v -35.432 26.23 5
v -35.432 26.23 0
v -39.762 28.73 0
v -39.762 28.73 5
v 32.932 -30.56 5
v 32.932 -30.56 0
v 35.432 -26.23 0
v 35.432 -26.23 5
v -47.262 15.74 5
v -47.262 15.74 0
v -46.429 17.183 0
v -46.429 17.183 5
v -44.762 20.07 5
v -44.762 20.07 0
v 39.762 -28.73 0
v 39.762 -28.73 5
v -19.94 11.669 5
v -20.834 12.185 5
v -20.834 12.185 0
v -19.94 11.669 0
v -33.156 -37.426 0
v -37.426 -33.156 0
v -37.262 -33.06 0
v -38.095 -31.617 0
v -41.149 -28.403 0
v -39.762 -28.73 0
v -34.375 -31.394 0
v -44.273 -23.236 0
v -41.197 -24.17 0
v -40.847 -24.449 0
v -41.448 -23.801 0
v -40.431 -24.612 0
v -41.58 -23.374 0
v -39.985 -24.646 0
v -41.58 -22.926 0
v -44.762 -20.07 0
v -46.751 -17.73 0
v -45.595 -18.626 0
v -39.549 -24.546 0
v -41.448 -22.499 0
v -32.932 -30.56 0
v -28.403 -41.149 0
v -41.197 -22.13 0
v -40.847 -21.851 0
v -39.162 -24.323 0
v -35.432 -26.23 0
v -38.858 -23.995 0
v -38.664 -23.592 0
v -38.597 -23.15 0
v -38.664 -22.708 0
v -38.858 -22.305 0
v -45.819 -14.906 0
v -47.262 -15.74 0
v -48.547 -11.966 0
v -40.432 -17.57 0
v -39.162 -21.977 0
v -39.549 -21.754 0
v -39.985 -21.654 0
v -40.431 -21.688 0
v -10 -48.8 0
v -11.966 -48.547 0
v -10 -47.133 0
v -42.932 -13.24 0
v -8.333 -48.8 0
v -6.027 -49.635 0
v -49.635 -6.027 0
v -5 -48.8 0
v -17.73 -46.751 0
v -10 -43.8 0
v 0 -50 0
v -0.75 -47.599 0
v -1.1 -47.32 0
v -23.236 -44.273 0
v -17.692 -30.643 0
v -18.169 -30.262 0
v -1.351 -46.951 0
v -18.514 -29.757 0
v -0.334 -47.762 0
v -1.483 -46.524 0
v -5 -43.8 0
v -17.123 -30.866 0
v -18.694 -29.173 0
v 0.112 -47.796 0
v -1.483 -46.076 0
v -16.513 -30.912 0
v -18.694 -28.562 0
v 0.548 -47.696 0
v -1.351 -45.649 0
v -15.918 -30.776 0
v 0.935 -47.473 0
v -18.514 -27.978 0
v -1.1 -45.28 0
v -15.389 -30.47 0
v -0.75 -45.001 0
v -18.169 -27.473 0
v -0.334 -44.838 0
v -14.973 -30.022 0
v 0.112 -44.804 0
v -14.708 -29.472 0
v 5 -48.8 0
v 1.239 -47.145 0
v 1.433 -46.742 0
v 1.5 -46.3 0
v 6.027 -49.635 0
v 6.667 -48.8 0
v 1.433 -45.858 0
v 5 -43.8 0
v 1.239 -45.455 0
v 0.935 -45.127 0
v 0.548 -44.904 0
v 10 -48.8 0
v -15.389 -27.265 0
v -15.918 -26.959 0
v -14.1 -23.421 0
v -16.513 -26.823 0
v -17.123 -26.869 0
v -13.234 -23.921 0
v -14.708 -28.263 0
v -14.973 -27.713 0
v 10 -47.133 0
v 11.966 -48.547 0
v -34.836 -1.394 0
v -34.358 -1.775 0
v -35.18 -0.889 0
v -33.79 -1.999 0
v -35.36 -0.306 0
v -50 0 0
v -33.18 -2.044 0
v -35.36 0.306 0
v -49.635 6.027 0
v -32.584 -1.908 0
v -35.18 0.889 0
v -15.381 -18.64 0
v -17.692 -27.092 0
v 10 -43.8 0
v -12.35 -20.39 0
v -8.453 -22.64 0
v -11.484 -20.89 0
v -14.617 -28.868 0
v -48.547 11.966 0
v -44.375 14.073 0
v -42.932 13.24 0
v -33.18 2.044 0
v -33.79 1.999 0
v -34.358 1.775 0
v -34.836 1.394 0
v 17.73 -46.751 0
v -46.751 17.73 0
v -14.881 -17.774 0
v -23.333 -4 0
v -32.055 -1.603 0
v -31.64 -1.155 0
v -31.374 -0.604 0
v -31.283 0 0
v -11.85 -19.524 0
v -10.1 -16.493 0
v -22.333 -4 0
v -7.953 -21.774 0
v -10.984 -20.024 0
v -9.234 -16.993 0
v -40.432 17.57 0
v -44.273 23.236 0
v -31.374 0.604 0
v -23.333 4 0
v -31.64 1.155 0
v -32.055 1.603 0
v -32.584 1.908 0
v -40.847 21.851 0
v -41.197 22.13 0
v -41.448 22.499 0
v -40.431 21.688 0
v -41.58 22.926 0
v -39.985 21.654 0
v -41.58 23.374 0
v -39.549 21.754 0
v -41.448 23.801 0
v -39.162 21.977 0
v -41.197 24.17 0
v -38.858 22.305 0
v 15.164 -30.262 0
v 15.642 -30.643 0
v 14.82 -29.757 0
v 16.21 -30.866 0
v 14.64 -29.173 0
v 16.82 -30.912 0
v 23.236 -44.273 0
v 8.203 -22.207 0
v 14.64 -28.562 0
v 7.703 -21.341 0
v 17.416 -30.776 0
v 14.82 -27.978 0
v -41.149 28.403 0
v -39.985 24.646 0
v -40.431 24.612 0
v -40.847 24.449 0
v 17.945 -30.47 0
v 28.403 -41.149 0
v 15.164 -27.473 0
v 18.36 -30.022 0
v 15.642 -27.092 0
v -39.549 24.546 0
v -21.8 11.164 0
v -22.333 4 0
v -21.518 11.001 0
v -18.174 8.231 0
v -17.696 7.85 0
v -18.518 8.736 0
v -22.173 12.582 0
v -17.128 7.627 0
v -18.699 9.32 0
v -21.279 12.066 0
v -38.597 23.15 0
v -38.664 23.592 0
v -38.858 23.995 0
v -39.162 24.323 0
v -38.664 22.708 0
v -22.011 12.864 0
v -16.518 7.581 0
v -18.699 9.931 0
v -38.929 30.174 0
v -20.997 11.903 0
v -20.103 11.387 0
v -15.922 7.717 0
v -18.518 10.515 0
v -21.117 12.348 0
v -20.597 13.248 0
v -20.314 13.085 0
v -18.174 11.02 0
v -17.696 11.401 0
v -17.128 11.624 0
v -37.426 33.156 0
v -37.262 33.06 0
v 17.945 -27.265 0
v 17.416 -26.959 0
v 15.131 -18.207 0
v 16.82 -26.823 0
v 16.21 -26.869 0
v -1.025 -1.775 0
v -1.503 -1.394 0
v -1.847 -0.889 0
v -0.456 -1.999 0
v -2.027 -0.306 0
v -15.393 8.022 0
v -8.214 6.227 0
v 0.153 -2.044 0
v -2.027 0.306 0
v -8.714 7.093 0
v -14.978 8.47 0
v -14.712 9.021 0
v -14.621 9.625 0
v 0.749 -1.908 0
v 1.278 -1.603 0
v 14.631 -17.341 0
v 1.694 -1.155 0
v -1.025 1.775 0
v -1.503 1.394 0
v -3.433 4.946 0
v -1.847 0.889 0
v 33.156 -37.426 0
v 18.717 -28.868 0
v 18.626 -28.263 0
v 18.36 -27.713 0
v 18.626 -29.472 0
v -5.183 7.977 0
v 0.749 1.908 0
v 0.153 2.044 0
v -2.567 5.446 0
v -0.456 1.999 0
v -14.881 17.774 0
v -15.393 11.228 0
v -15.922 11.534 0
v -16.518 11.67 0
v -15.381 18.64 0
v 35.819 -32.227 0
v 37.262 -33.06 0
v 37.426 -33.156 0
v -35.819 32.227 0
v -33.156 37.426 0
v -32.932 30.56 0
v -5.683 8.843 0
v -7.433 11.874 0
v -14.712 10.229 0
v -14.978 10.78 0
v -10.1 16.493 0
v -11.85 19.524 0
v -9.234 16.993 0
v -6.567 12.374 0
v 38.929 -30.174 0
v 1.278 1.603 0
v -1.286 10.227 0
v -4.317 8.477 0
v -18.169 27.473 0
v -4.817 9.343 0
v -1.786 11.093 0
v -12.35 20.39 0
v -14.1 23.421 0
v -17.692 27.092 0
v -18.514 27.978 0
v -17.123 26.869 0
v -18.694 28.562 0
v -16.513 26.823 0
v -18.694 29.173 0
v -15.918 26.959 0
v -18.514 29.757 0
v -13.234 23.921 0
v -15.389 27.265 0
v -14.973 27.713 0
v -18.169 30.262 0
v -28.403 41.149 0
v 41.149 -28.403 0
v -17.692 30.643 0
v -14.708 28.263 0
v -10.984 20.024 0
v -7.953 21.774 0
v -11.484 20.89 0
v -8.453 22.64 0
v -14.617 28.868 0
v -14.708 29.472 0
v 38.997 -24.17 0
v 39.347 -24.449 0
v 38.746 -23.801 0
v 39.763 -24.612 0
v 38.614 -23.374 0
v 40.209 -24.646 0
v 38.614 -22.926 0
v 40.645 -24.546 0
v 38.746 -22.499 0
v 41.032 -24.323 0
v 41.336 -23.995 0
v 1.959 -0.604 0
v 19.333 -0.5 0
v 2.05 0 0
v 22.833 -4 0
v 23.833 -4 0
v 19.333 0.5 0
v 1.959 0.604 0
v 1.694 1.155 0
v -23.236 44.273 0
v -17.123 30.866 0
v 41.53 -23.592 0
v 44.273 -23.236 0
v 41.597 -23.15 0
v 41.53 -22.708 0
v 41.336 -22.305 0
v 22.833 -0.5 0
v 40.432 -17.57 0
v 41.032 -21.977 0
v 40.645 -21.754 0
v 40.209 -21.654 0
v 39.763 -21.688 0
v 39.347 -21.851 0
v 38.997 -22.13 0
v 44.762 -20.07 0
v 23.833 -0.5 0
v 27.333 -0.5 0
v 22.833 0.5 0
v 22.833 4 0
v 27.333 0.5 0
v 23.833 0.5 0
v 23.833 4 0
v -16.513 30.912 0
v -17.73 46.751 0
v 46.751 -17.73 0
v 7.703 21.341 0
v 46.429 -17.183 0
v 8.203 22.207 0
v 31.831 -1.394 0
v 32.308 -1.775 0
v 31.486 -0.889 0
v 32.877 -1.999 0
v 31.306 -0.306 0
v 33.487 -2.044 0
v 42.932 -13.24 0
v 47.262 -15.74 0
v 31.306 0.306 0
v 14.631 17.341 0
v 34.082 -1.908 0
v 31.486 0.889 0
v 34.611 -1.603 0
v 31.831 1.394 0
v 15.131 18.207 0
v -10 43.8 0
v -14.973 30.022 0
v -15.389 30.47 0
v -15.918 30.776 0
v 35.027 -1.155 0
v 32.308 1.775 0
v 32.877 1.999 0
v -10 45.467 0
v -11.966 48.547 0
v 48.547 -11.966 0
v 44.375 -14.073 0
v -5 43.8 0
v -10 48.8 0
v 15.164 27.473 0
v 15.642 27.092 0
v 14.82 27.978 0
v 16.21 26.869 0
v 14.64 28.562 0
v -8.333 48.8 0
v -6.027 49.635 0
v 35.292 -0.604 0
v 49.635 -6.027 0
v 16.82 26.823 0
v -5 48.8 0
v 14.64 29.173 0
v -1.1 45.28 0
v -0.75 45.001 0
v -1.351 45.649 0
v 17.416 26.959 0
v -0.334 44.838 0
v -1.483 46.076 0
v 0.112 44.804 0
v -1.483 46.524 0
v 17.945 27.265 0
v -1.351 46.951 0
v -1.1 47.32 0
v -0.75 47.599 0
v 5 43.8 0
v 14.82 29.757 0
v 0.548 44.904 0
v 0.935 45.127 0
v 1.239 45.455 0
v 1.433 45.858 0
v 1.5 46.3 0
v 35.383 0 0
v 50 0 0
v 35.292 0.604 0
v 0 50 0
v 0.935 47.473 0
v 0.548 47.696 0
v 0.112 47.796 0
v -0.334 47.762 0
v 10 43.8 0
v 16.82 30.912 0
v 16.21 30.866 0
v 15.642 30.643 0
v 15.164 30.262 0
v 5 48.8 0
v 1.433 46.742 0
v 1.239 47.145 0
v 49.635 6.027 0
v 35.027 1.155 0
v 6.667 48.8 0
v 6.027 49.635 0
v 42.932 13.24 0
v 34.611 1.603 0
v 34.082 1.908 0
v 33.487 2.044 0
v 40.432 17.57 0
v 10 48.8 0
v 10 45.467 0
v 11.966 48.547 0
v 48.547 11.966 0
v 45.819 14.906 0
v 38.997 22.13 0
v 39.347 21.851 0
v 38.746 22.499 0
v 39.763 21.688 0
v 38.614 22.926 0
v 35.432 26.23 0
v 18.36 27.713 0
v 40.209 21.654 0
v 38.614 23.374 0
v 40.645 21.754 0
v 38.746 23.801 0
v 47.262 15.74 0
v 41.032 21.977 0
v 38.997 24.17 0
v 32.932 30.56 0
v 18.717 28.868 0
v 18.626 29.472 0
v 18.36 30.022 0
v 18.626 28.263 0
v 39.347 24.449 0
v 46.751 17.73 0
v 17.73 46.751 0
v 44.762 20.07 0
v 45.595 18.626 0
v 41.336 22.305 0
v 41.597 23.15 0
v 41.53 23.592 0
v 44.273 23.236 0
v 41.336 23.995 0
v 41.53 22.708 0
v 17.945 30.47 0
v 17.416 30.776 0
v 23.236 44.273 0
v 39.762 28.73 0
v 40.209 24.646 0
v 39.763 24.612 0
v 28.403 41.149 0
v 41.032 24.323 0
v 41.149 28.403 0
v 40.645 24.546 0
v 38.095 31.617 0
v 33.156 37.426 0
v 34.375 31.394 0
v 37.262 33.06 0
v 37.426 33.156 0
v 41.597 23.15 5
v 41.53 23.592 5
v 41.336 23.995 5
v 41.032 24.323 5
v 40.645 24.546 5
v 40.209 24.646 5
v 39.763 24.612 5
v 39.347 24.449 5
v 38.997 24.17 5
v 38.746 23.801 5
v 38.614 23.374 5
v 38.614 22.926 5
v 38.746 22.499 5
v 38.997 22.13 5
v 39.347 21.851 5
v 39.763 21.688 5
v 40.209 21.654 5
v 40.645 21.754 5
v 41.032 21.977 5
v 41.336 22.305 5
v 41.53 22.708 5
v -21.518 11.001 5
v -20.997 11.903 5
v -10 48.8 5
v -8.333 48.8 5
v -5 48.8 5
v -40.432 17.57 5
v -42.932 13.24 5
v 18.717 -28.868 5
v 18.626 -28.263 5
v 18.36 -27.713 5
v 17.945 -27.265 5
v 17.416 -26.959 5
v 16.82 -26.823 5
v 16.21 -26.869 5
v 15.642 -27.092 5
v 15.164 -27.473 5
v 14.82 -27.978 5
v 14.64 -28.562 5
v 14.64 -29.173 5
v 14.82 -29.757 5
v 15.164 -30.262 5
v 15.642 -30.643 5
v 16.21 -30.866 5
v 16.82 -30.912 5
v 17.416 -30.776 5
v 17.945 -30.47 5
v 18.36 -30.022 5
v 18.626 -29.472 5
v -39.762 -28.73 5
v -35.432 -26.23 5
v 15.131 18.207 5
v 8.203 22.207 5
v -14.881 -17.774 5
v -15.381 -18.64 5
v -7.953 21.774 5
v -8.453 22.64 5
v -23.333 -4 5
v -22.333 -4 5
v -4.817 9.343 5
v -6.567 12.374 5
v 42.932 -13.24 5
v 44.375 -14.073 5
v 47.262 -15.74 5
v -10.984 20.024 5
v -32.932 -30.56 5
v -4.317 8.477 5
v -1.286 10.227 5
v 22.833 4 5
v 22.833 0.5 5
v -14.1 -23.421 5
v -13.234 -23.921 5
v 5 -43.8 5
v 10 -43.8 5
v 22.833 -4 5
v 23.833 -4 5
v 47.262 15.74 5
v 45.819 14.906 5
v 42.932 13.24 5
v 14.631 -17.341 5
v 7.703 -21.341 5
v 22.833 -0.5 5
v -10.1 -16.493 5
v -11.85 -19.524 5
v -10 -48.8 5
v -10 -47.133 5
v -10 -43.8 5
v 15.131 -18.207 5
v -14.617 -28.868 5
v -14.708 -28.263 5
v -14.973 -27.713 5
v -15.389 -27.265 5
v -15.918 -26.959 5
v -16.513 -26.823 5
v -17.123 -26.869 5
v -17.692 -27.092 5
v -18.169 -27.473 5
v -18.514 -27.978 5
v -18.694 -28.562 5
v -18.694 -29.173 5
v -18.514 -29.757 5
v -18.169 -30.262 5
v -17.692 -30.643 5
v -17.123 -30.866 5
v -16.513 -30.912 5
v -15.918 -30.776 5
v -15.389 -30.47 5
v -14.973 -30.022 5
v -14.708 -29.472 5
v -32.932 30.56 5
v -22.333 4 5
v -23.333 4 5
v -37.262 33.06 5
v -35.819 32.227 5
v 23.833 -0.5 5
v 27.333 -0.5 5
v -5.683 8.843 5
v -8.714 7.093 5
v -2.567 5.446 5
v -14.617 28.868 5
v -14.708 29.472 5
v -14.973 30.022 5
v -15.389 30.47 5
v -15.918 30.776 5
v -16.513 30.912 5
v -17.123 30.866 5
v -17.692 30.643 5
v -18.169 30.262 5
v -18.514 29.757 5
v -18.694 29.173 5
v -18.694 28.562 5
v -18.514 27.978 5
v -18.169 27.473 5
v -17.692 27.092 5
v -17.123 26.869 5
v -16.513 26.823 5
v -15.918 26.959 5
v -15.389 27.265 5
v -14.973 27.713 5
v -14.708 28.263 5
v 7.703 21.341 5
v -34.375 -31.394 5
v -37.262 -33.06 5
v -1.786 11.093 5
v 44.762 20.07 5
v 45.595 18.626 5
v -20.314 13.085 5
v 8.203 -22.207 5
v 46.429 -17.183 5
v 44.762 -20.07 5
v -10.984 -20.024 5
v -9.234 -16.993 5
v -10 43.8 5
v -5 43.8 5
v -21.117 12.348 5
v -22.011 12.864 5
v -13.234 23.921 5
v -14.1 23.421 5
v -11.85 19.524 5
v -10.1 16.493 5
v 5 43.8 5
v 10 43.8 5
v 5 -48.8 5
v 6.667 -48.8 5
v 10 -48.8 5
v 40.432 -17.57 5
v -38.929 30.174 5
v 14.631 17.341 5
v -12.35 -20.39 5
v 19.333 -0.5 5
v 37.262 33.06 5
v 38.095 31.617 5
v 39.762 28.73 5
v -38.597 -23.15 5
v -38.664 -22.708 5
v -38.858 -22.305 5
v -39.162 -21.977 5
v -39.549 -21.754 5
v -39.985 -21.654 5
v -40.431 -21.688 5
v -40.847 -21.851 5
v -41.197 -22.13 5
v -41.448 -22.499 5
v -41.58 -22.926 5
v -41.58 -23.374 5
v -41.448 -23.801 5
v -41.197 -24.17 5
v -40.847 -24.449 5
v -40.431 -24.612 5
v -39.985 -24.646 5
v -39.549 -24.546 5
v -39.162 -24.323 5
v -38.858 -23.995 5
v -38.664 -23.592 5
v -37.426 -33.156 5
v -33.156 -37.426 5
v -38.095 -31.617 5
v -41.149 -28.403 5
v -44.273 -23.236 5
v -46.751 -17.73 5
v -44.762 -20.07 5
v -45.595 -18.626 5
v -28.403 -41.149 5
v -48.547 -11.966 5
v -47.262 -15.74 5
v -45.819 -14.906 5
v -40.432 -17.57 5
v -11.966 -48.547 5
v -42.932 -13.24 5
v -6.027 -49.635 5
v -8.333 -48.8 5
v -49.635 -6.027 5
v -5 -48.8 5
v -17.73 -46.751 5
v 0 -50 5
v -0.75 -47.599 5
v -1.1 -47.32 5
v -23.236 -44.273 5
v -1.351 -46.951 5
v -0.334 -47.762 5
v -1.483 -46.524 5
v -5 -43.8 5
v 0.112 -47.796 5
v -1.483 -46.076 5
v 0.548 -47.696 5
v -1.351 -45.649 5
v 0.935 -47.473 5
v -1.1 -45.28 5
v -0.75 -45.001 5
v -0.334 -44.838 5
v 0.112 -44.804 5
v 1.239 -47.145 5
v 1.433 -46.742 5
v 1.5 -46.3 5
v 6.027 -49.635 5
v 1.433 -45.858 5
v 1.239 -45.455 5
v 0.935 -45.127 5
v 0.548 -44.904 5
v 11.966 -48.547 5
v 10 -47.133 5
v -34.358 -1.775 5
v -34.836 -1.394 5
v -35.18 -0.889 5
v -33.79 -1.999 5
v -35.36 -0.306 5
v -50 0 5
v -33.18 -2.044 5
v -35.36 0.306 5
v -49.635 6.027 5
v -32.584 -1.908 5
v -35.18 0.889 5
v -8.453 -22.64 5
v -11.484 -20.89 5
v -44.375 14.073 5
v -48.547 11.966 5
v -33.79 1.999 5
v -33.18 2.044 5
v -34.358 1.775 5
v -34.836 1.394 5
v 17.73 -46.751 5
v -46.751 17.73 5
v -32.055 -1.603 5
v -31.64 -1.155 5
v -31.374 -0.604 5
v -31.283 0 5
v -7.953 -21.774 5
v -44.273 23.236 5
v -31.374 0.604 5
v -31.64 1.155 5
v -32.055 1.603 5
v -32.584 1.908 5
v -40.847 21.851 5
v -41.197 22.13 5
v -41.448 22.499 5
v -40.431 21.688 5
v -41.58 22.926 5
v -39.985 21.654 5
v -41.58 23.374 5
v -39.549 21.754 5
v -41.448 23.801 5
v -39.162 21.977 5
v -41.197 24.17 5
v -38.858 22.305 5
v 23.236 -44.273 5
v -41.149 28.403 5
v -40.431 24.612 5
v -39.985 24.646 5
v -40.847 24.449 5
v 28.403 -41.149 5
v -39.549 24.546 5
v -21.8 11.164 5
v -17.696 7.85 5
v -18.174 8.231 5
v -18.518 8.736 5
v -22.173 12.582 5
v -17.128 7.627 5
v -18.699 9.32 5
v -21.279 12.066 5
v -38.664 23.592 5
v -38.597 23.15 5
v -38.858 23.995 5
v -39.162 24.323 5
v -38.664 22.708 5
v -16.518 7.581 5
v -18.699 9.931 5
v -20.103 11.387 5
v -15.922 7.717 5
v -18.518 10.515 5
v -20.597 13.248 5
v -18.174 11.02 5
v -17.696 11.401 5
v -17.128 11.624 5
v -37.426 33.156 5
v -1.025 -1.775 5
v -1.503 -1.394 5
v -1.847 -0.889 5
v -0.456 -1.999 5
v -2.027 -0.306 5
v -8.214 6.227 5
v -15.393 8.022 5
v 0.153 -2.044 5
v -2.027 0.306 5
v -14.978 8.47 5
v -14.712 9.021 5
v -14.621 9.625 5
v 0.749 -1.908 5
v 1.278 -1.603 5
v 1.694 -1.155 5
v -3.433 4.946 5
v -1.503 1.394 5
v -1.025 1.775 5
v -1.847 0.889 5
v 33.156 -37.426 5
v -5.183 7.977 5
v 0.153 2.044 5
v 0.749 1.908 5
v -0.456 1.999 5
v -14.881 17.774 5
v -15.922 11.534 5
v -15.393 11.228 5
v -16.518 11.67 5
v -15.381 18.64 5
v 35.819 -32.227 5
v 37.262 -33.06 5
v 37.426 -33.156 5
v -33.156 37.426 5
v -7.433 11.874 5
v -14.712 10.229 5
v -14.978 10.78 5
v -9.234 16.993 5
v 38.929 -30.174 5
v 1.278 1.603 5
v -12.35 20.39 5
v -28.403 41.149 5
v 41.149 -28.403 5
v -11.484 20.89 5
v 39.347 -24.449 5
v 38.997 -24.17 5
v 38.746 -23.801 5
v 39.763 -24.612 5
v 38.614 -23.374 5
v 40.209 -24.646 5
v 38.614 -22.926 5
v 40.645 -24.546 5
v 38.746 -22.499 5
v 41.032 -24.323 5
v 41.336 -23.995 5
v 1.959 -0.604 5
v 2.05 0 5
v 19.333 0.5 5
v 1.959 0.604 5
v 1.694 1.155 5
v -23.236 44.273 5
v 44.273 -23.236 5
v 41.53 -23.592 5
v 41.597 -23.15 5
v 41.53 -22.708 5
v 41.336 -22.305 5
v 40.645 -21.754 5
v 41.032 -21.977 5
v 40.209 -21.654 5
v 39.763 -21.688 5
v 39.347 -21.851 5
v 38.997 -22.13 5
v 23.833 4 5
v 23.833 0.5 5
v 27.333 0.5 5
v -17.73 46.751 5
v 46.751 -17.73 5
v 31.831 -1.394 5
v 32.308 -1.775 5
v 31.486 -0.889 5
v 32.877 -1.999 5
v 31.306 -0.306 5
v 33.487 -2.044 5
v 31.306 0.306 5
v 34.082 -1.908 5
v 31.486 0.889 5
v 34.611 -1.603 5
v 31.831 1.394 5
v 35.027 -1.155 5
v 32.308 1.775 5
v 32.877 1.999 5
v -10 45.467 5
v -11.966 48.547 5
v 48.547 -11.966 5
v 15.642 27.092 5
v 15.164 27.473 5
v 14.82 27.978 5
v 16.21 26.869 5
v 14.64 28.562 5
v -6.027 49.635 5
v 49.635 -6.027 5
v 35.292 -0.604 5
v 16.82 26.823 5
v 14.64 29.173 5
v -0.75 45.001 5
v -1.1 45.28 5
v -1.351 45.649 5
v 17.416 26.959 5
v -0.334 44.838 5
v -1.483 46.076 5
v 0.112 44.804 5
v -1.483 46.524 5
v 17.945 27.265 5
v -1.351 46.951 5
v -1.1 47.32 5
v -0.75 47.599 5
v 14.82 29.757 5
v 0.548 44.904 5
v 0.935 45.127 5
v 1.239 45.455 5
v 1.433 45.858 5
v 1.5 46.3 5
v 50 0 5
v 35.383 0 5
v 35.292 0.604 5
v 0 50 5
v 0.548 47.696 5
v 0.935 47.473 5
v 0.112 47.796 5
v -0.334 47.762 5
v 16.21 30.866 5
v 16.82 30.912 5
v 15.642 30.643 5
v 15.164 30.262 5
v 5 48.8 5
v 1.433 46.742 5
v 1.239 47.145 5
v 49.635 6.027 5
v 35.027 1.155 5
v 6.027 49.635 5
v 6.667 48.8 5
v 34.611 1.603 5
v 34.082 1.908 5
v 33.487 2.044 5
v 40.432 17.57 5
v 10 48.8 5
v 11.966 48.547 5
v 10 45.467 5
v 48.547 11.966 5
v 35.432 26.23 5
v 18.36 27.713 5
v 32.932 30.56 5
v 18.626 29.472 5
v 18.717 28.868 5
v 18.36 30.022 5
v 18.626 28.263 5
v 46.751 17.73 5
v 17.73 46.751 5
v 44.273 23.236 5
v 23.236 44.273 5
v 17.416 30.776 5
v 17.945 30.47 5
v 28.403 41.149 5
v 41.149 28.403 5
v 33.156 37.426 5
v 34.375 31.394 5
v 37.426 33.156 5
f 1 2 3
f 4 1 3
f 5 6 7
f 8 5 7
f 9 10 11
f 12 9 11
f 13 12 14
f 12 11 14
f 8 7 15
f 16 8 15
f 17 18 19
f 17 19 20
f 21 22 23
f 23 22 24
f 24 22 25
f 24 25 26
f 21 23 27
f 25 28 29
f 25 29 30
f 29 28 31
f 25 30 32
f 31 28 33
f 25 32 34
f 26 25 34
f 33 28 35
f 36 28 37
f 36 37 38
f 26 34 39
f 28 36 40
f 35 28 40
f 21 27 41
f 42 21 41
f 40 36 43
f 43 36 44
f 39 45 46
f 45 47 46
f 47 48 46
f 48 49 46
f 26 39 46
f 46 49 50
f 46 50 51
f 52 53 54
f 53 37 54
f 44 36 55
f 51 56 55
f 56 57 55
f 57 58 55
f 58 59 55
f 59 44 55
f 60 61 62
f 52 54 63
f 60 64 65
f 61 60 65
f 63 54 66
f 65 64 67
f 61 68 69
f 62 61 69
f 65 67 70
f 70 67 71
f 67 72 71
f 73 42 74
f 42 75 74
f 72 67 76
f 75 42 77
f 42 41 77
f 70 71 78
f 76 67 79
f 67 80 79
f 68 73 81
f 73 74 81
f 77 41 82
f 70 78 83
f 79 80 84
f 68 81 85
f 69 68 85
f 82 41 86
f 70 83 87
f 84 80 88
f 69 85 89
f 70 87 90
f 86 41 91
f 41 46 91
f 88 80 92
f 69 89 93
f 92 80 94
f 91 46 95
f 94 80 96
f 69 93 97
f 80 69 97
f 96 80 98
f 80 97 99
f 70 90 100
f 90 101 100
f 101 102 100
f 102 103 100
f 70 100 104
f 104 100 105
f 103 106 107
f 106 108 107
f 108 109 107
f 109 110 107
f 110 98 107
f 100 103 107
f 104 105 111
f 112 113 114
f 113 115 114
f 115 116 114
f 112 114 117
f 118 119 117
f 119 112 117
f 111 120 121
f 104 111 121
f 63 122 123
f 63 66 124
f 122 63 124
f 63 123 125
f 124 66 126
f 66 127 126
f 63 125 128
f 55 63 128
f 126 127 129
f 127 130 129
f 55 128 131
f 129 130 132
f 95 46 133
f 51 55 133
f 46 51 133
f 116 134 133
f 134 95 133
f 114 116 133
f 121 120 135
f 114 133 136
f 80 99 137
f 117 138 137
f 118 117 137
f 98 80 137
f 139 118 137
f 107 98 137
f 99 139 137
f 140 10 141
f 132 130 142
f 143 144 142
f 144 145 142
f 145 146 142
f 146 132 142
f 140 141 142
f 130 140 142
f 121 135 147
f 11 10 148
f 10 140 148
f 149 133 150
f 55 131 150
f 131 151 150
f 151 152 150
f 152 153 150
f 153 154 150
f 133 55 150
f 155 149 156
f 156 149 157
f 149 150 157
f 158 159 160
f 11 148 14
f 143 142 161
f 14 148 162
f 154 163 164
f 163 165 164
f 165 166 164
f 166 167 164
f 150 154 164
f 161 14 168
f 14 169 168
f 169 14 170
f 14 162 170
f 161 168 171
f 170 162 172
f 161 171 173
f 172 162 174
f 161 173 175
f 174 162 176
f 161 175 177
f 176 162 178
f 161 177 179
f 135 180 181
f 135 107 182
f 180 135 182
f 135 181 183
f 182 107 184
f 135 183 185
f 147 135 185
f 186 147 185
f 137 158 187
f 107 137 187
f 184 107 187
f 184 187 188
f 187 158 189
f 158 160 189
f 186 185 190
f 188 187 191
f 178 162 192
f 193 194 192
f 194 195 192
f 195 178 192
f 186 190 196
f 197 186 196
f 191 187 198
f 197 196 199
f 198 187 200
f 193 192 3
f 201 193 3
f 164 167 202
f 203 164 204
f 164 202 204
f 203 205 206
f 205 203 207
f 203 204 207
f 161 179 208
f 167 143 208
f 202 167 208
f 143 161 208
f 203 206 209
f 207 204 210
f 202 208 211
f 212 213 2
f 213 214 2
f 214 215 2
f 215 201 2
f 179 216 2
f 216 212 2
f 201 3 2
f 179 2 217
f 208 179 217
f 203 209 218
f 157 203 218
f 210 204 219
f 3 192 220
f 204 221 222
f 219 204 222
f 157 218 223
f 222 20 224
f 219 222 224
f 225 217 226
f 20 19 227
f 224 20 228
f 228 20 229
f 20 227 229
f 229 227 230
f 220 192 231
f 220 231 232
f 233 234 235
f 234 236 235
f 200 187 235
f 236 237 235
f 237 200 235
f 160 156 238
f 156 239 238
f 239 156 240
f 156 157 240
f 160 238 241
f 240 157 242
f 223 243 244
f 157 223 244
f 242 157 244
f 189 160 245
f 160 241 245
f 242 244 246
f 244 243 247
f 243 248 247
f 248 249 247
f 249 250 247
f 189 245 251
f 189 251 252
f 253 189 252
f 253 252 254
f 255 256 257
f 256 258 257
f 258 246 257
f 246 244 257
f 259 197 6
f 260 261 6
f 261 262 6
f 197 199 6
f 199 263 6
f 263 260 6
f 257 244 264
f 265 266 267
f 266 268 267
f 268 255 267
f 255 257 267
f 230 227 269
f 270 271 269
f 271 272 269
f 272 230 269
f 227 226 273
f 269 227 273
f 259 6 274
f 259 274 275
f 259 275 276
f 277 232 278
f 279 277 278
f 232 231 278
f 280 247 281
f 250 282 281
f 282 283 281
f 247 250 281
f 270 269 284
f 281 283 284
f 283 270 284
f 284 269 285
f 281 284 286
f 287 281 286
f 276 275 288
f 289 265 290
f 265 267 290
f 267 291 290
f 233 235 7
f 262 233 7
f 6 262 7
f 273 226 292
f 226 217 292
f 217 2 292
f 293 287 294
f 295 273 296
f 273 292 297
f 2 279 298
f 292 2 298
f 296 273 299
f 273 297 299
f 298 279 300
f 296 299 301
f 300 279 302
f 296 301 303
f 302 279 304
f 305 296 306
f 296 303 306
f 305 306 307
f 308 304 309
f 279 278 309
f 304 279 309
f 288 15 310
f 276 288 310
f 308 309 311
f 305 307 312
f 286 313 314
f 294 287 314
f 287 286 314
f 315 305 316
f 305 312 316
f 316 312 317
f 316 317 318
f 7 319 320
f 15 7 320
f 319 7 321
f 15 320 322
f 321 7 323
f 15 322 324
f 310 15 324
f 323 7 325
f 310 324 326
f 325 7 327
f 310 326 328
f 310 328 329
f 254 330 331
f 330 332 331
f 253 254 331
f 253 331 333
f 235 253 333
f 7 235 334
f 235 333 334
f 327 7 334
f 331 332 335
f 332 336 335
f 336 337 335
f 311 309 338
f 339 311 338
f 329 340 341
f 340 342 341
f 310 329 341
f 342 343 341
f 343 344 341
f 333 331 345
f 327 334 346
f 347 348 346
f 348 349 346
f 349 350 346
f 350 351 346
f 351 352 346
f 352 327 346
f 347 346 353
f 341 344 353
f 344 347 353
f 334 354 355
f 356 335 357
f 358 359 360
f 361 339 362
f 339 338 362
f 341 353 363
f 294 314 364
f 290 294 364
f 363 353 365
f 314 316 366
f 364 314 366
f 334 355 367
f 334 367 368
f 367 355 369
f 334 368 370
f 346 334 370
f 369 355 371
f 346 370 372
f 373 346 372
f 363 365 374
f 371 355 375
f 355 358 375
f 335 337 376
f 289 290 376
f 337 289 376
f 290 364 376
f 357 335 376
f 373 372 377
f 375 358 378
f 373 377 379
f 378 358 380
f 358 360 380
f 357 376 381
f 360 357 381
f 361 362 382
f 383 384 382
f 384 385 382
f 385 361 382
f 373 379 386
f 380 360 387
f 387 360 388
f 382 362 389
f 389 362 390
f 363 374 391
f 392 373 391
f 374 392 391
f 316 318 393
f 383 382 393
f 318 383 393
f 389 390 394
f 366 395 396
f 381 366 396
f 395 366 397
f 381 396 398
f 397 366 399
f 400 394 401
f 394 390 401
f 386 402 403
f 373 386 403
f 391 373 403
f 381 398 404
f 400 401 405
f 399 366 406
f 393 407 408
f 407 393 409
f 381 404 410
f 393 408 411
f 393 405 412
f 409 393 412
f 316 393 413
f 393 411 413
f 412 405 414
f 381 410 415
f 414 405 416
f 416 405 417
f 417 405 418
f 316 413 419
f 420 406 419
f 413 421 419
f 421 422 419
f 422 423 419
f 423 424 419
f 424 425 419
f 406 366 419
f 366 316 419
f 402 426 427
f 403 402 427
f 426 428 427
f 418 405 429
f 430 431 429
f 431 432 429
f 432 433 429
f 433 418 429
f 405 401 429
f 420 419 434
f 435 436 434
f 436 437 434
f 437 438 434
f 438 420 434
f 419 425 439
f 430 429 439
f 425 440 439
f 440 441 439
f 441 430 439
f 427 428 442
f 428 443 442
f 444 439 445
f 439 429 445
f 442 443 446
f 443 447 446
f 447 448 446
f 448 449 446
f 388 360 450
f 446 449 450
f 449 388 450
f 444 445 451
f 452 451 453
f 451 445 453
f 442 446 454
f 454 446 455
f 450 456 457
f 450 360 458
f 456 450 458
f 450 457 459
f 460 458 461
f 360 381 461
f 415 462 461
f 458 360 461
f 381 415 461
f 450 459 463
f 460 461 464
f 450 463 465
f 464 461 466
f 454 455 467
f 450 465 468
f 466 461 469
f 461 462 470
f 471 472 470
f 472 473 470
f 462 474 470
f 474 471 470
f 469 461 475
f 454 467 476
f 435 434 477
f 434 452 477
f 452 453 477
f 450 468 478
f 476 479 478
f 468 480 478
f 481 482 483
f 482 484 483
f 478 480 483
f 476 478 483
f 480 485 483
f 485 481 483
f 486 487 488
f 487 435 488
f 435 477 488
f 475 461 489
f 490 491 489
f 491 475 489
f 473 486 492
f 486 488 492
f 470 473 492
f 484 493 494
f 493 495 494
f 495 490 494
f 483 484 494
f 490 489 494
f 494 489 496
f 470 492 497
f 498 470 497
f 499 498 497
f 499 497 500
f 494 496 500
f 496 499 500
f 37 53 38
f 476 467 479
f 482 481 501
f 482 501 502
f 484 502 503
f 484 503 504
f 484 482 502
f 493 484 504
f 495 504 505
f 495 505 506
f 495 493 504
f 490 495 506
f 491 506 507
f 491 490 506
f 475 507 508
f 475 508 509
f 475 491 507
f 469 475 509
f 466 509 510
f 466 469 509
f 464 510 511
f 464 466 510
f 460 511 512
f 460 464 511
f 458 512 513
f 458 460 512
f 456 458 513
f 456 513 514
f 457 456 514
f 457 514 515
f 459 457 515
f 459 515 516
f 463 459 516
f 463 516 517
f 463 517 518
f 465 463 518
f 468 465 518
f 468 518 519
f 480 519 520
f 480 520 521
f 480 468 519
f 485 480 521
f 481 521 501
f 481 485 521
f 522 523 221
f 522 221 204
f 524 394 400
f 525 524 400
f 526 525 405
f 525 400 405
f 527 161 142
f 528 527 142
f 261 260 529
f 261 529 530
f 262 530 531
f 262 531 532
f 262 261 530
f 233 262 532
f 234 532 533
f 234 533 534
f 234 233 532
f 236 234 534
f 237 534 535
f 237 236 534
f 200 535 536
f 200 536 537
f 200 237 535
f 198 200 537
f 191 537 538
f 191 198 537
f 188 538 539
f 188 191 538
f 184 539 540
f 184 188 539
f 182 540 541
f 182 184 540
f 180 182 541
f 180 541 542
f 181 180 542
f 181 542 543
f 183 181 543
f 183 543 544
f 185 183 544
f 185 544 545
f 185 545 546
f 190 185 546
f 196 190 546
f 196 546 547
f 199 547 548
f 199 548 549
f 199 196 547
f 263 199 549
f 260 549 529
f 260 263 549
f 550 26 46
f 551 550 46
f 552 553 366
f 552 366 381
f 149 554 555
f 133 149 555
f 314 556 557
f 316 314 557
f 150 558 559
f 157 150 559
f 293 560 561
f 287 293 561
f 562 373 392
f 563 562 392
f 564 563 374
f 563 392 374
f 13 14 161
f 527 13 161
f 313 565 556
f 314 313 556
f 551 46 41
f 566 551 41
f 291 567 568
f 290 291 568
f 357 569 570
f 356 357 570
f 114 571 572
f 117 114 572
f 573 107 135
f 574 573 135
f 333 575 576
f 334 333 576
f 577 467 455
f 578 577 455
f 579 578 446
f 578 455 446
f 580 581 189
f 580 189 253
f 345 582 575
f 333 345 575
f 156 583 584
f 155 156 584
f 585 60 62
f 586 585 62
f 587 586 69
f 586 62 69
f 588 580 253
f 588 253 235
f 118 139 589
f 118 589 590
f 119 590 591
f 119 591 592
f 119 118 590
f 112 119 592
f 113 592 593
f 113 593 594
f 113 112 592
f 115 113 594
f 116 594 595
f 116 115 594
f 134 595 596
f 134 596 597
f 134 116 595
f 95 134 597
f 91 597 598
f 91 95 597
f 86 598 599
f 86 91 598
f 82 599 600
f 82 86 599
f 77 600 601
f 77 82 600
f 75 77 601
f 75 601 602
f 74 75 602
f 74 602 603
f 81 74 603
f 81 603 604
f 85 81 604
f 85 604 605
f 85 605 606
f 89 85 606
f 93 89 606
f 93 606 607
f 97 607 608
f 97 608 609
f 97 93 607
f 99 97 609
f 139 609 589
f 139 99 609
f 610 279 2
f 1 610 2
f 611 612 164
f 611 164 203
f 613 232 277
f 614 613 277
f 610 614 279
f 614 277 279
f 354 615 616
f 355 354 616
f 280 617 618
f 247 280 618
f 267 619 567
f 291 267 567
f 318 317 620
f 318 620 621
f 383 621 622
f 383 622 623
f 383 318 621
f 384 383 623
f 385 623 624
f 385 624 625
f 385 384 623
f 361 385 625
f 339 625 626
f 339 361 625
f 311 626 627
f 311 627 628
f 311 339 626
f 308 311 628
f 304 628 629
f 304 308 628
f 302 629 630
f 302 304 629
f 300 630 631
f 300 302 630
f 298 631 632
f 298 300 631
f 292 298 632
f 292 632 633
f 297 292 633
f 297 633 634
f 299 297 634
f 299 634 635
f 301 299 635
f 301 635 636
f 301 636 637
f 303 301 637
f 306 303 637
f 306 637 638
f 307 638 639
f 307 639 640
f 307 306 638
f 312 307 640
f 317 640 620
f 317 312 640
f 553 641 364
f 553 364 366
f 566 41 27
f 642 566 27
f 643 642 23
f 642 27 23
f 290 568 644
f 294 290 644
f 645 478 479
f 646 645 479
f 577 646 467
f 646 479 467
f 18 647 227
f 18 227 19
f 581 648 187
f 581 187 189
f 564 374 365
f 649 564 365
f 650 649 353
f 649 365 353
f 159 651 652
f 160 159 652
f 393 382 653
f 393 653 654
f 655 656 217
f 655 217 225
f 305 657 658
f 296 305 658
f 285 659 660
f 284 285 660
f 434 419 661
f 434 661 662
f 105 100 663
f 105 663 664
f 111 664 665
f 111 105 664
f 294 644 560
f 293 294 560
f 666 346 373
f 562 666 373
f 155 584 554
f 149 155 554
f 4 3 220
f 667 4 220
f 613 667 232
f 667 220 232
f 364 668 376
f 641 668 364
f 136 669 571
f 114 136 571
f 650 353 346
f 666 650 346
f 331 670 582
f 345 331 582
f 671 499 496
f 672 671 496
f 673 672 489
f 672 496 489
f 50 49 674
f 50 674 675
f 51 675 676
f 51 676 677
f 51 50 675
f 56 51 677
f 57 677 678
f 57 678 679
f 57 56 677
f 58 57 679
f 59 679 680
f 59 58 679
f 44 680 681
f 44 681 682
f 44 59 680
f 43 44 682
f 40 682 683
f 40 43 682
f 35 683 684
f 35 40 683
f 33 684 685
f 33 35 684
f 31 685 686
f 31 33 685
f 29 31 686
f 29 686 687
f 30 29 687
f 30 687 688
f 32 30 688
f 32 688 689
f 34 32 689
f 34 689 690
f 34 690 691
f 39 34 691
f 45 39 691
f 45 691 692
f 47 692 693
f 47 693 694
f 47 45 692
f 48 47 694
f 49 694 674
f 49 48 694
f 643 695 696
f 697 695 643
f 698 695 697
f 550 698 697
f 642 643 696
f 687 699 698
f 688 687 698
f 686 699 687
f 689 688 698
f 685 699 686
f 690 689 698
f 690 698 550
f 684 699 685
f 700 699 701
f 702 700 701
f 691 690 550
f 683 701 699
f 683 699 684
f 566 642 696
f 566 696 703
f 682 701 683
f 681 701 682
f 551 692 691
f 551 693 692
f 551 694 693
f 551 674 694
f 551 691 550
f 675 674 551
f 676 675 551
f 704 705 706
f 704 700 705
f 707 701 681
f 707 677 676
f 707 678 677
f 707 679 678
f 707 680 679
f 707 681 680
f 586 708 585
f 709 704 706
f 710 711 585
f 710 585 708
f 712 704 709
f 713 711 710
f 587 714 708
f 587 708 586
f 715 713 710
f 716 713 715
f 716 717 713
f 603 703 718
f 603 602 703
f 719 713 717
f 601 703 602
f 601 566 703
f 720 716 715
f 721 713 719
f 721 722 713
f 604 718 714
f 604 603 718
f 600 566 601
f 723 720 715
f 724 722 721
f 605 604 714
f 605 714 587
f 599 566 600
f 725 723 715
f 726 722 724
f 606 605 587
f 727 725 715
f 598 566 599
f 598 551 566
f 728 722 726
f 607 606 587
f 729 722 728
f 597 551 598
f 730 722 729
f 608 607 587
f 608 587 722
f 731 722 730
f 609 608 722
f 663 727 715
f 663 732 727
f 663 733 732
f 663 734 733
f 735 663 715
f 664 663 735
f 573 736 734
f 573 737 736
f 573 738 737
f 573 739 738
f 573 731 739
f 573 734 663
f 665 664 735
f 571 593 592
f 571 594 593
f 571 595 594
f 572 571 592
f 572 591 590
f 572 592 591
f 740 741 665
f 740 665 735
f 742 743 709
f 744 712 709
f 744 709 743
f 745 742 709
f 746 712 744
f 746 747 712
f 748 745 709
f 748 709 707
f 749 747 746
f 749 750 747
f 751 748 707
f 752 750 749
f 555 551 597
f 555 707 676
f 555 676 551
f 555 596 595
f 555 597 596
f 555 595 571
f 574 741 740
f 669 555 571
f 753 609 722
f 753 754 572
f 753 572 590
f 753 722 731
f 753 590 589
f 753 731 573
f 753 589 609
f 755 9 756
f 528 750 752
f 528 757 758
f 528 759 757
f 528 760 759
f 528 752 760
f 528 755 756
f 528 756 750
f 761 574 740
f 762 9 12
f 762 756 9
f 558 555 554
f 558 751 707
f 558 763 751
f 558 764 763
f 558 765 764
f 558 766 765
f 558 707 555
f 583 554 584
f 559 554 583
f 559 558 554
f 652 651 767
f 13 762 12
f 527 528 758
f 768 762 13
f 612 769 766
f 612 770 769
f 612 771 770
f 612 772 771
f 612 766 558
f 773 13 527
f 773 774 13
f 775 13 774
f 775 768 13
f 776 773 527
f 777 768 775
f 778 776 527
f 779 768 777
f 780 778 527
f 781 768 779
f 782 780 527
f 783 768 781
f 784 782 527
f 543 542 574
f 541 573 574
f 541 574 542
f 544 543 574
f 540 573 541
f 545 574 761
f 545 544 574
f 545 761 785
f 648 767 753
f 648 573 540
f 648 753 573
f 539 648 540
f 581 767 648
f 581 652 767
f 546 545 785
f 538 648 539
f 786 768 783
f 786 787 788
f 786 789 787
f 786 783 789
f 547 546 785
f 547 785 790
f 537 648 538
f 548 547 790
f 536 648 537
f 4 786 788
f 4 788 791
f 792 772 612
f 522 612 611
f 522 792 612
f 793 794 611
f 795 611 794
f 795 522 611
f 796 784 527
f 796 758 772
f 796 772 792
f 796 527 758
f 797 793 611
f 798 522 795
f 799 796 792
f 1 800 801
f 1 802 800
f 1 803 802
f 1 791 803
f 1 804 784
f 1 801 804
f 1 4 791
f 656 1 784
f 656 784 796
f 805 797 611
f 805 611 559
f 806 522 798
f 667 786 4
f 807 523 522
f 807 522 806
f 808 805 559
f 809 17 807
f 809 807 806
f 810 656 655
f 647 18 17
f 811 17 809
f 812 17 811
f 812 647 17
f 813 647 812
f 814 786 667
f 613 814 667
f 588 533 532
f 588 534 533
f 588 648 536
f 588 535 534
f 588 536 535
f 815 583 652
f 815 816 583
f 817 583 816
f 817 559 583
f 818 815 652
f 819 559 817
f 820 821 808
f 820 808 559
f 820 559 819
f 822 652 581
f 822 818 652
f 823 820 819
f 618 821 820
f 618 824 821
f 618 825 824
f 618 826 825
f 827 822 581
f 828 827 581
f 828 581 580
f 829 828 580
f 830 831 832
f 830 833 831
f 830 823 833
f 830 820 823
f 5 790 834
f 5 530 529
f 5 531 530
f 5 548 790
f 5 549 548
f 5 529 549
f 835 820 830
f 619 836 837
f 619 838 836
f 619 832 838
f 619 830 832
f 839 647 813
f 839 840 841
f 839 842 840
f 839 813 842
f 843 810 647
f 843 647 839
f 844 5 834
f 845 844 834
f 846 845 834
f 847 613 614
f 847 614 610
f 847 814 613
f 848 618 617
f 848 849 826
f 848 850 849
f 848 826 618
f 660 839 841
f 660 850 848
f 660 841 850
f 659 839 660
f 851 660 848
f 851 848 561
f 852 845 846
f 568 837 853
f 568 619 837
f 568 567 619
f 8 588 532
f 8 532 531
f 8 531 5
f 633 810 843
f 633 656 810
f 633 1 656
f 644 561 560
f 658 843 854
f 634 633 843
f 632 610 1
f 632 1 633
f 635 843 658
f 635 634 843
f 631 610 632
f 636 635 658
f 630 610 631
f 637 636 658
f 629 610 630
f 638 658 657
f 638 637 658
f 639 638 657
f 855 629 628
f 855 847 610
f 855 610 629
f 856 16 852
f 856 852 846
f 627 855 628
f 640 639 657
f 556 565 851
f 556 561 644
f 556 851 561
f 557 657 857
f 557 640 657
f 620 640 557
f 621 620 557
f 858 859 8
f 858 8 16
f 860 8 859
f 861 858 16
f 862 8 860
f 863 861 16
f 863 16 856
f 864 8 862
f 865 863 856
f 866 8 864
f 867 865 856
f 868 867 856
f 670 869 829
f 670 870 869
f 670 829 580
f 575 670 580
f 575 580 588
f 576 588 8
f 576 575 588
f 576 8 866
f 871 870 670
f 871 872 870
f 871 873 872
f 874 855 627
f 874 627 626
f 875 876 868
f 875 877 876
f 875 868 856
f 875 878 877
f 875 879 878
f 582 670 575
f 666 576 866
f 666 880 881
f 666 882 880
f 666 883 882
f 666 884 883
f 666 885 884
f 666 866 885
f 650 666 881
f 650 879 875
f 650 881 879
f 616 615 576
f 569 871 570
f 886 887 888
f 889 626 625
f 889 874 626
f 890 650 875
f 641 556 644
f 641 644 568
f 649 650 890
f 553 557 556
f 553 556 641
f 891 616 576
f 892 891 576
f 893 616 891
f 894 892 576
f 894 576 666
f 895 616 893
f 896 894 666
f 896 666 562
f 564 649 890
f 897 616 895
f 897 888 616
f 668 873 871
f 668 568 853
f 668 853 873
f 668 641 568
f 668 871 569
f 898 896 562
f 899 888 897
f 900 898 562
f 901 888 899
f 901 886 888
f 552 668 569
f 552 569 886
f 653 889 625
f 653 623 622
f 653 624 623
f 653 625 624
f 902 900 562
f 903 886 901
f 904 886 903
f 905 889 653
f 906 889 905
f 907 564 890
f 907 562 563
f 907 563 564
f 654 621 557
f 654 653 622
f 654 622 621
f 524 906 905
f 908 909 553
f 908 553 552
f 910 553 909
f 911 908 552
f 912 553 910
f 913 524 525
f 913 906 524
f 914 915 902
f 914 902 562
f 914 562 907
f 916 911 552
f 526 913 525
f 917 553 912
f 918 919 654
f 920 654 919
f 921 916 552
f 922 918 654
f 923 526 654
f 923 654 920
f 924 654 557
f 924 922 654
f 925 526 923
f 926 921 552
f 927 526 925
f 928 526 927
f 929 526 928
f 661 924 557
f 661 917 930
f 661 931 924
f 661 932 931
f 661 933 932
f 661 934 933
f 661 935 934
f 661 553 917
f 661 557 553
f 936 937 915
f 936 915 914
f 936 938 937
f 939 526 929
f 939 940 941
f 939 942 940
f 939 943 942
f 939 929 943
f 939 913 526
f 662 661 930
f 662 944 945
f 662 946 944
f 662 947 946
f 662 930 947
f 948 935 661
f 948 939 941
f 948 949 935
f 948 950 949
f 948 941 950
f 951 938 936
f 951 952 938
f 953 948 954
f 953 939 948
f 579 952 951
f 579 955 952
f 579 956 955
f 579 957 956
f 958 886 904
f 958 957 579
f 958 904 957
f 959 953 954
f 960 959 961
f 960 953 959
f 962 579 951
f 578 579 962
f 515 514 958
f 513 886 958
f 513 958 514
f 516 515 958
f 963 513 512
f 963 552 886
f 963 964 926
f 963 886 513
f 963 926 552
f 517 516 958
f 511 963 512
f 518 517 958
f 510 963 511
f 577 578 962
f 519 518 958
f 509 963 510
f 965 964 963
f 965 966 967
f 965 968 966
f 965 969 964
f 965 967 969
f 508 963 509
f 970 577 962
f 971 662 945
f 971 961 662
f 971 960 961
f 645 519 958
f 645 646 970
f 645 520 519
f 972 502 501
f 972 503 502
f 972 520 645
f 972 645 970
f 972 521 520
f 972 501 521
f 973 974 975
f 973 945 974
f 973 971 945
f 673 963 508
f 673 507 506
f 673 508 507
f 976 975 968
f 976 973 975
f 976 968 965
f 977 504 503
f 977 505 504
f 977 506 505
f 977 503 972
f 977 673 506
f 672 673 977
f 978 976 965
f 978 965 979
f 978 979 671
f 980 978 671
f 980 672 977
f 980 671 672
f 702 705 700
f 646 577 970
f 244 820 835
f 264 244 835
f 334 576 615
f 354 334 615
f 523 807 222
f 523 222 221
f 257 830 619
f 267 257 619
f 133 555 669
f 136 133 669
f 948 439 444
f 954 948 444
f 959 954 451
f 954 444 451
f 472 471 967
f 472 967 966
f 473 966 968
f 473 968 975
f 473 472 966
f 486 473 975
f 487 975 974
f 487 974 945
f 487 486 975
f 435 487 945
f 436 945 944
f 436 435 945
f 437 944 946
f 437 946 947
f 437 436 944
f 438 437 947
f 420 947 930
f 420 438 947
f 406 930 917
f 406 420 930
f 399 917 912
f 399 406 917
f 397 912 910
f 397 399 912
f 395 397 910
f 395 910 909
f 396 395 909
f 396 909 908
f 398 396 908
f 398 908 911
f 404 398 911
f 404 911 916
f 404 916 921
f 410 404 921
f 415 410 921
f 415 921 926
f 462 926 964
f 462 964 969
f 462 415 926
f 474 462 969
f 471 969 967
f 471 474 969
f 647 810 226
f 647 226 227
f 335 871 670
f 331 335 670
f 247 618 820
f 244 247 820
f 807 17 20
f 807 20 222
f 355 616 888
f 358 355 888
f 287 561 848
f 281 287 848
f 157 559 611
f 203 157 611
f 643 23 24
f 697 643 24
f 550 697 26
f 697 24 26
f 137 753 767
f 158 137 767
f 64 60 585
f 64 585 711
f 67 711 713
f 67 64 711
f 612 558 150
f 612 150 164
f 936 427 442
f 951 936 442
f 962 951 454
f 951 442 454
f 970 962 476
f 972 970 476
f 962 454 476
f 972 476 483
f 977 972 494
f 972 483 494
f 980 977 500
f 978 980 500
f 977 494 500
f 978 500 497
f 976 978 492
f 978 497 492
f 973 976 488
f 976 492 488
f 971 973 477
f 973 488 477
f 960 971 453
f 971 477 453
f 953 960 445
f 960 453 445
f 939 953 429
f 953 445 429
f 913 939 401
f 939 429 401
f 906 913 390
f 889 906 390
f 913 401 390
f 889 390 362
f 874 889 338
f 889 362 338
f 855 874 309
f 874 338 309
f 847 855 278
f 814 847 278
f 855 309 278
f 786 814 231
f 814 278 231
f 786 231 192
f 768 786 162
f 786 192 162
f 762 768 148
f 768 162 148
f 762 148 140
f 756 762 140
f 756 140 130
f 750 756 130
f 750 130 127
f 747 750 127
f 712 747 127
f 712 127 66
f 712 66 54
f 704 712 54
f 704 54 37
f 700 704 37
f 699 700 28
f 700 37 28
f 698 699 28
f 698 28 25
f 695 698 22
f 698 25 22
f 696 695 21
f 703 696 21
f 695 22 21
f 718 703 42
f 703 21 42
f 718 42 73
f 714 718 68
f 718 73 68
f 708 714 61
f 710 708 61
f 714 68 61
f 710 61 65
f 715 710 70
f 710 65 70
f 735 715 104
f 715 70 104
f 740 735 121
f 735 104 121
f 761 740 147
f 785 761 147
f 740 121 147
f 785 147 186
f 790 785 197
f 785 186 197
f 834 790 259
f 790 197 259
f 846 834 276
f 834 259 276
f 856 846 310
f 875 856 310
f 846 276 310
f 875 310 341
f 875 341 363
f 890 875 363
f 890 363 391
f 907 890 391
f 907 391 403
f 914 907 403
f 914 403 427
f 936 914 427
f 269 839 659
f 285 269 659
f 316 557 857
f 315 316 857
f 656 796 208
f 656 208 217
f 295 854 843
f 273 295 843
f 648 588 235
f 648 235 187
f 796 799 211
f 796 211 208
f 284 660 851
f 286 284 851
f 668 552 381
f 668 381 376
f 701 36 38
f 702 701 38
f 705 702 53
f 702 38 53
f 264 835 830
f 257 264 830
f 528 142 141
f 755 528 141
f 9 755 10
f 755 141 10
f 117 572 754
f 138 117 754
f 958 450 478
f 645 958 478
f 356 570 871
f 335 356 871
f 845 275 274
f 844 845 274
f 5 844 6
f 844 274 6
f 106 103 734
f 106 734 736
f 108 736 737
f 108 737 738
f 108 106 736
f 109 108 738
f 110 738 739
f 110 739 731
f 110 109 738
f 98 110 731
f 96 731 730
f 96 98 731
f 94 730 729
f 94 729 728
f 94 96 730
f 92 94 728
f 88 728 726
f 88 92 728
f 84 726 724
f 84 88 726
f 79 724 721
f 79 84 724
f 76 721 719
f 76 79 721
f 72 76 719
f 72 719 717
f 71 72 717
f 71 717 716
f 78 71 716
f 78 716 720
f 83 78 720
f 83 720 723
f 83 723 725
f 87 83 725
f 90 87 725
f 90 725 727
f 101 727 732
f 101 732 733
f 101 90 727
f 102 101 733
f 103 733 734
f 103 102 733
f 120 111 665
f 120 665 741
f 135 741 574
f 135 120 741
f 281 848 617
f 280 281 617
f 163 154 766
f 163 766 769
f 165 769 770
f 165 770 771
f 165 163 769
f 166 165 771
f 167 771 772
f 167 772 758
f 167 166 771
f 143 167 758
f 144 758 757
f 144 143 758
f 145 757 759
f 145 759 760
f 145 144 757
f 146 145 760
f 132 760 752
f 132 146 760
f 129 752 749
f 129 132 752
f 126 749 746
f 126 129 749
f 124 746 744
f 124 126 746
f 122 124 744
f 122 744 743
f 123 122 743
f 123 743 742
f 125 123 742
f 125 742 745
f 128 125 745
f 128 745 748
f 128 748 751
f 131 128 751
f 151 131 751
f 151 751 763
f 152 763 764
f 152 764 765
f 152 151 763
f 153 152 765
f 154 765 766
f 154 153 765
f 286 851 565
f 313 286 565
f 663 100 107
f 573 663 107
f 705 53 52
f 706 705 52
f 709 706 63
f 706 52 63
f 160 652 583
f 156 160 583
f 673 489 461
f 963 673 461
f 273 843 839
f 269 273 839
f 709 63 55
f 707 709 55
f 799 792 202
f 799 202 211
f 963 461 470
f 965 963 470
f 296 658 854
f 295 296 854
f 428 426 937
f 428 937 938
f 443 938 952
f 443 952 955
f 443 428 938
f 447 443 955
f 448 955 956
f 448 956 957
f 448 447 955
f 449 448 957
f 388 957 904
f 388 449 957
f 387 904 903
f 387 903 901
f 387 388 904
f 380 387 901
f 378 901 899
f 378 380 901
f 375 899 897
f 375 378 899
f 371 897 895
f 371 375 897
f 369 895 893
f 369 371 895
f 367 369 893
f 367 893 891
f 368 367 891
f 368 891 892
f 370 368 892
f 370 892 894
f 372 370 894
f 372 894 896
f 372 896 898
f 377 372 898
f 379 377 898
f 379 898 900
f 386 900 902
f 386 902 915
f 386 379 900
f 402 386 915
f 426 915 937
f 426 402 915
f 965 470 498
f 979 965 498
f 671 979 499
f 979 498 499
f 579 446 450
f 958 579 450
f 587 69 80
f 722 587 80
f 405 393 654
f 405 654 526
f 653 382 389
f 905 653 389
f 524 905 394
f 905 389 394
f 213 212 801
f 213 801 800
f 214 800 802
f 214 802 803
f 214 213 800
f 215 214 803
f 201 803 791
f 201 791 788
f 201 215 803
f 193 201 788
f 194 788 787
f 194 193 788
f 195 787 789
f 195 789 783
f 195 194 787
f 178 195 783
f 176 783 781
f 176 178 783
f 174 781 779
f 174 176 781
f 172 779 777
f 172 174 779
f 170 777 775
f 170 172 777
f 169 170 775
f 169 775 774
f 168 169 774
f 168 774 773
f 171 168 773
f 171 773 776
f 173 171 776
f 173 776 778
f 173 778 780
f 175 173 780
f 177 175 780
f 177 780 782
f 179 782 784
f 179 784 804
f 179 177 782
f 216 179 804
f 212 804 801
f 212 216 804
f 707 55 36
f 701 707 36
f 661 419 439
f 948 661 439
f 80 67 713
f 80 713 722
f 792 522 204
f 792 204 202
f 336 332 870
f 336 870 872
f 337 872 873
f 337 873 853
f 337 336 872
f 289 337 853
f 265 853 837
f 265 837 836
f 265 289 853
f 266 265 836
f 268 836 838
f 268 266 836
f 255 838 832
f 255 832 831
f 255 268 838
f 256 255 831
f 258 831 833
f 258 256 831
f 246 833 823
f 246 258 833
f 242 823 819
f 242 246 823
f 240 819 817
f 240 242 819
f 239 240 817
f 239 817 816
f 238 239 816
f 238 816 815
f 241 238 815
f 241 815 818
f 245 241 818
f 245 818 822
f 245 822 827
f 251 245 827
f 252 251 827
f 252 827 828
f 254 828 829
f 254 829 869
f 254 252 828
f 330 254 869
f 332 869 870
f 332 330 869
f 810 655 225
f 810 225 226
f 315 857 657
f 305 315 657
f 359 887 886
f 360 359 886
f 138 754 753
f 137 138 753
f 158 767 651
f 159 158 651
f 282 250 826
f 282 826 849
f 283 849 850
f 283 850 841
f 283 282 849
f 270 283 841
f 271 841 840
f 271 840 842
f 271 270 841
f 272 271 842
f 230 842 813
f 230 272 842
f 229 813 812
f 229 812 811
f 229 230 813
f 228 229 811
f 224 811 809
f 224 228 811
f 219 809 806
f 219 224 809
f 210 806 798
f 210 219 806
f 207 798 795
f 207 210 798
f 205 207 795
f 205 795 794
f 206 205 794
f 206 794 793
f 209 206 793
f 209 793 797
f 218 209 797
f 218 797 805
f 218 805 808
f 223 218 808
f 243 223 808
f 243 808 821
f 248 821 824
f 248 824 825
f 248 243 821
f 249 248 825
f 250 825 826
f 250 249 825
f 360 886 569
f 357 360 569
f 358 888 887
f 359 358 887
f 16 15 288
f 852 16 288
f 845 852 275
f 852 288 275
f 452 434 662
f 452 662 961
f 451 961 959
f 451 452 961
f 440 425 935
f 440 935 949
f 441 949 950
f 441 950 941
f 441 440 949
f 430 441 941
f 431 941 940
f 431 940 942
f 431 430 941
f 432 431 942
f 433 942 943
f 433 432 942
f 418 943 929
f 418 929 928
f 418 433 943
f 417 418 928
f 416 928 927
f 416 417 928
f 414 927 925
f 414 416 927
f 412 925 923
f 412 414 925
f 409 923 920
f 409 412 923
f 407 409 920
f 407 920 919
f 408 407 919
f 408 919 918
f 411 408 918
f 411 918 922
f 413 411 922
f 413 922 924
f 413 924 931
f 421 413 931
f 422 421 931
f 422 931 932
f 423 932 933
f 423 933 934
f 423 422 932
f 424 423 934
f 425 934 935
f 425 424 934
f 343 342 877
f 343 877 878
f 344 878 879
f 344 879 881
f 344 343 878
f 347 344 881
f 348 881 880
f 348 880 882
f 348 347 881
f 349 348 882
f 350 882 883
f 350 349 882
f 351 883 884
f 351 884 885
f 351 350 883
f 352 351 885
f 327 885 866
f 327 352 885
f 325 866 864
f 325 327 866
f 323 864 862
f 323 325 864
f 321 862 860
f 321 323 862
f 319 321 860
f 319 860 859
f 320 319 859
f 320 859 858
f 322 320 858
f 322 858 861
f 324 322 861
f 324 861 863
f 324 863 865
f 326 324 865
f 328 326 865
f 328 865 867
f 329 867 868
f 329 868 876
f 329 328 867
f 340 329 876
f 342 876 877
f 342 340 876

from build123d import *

# Parameters (mm, degrees)
BOSS_EXTRU_1_OUTLINE_R   = 50
BOSS_EXTRU_1_OUTLINE_W   = 5
BOSS_EXTRU_1_OUTLINE_H   = 5
BOSS_EXTRU_1_OUTLINE_R_2 = 2.05
BOSS_EXTRU_1_OUTLINE_R_3 = 1.5
BOSS_EXTRU_1_DEPTH       = 5
SKETCH3_W                = 1
SKETCH3_H                = 8
CUT_EXTRUDE2_DEPTH       = 10


# Read off the part's stored shape, not the designer's step: Boss.-Extru.1
with BuildPart() as part:
    # Boss.-Extru.1 outline → Boss.-Extru.1 (new body)
    with BuildSketch(Plane.XY):
        Circle(BOSS_EXTRU_1_OUTLINE_R)
        Polygon((-37.262039705, -33.060254038), (-39.762039705, -28.730127019), (-35.431912686, -26.230127019), (-32.931912686, -30.560254038), align=None, mode=Mode.SUBTRACT)
        with Locations((-7.5, -46.3)):
            Rectangle(BOSS_EXTRU_1_OUTLINE_W, BOSS_EXTRU_1_OUTLINE_H, mode=Mode.SUBTRACT)
        with Locations((-16.666666667, -28.867513459)):
            Circle(BOSS_EXTRU_1_OUTLINE_R_2, mode=Mode.SUBTRACT)
        with Locations((-40.096976195, -23.15)):
            Circle(BOSS_EXTRU_1_OUTLINE_R_3, mode=Mode.SUBTRACT)
        Polygon((-42.931912686, -13.239745962), (-40.431912686, -17.569872981), (-44.762039705, -20.069872981), (-47.262039705, -15.739745962), align=None, mode=Mode.SUBTRACT)
        with Locations((0, -46.3)):
            Circle(BOSS_EXTRU_1_OUTLINE_R_3, mode=Mode.SUBTRACT)
        with Locations((7.5, -46.3)):
            Rectangle(BOSS_EXTRU_1_OUTLINE_W, BOSS_EXTRU_1_OUTLINE_H, mode=Mode.SUBTRACT)
        with Locations((16.666666667, -28.867513459)):
            Circle(BOSS_EXTRU_1_OUTLINE_R_2, mode=Mode.SUBTRACT)
        Polygon((32.931912686, -30.560254038), (35.431912686, -26.230127019), (39.762039705, -28.730127019), (37.262039705, -33.060254038), align=None, mode=Mode.SUBTRACT)
        with Locations((40.096976195, -23.15)):
            Circle(BOSS_EXTRU_1_OUTLINE_R_3, mode=Mode.SUBTRACT)
        Polygon((47.262039705, -15.739745962), (44.762039705, -20.069872981), (40.431912686, -17.569872981), (42.931912686, -13.239745962), align=None, mode=Mode.SUBTRACT)
        with Locations((-33.333333333, 0)):
            Circle(BOSS_EXTRU_1_OUTLINE_R_2, mode=Mode.SUBTRACT)
        Polygon((-47.262039705, 15.739745962), (-44.762039705, 20.069872981), (-40.431912686, 17.569872981), (-42.931912686, 13.239745962), align=None, mode=Mode.SUBTRACT)
        with Locations((-40.096976195, 23.15)):
            Circle(BOSS_EXTRU_1_OUTLINE_R_3, mode=Mode.SUBTRACT)
        with Locations((-16.671397032, 9.625235564)):
            Circle(BOSS_EXTRU_1_OUTLINE_R_2, mode=Mode.SUBTRACT)
        Polygon((-32.931912686, 30.560254038), (-35.431912686, 26.230127019), (-39.762039705, 28.730127019), (-37.262039705, 33.060254038), align=None, mode=Mode.SUBTRACT)
        with Locations((-16.666666667, 28.867513459)):
            Circle(BOSS_EXTRU_1_OUTLINE_R_2, mode=Mode.SUBTRACT)
        with Locations((-7.5, 46.3)):
            Rectangle(BOSS_EXTRU_1_OUTLINE_W, BOSS_EXTRU_1_OUTLINE_H, mode=Mode.SUBTRACT)
        Circle(BOSS_EXTRU_1_OUTLINE_R_2, mode=Mode.SUBTRACT)
        with Locations((33.333333333, 0)):
            Circle(BOSS_EXTRU_1_OUTLINE_R_2, mode=Mode.SUBTRACT)
        Polygon((42.931912686, 13.239745962), (40.431912686, 17.569872981), (44.762039705, 20.069872981), (47.262039705, 15.739745962), align=None, mode=Mode.SUBTRACT)
        with Locations((40.096976195, 23.15)):
            Circle(BOSS_EXTRU_1_OUTLINE_R_3, mode=Mode.SUBTRACT)
        with Locations((16.666666667, 28.867513459)):
            Circle(BOSS_EXTRU_1_OUTLINE_R_2, mode=Mode.SUBTRACT)
        with Locations((0, 46.3)):
            Circle(BOSS_EXTRU_1_OUTLINE_R_3, mode=Mode.SUBTRACT)
        with Locations((7.5, 46.3)):
            Rectangle(BOSS_EXTRU_1_OUTLINE_W, BOSS_EXTRU_1_OUTLINE_H, mode=Mode.SUBTRACT)
        Polygon((37.262039705, 33.060254038), (39.762039705, 28.730127019), (35.431912686, 26.230127019), (32.931912686, 30.560254038), align=None, mode=Mode.SUBTRACT)
    extrude(amount=BOSS_EXTRU_1_DEPTH)

    # Sketch3 → Cut-Extrude2 (cut)
    with BuildSketch(Plane.XY.offset(5)):
        with Locations((-22.833333333, 0)):
            Rectangle(SKETCH3_W, SKETCH3_H)
        Polygon((-13.233653965, 23.921361037), (-14.099679369, 23.421361037), (-12.349679369, 20.390272124), (-15.380768282, 18.640272124), (-14.880768282, 17.77424672), (-11.849679369, 19.52424672), (-10.099679369, 16.493157806), (-9.233653965, 16.993157806), (-10.983653965, 20.02424672), (-7.952565052, 21.77424672), (-8.452565052, 22.640272124), (-11.483653965, 20.890272124), align=None)
        Polygon((15.130768282, 18.207259422), (14.630768282, 17.341234018), (7.702565052, 21.341234018), (8.202565052, 22.207259422), align=None)
        Polygon((8.202565052, -22.207259422), (7.702565052, -21.341234018), (14.630768282, -17.341234018), (15.130768282, -18.207259422), align=None)
        Polygon((27.333333333, -0.5), (27.333333333, 0.5), (23.833333333, 0.5), (23.833333333, 4), (22.833333333, 4), (22.833333333, 0.5), (19.333333333, 0.5), (19.333333333, -0.5), (22.833333333, -0.5), (22.833333333, -4), (23.833333333, -4), (23.833333333, -0.5), align=None)
        Polygon((-14.099679369, -23.421361037), (-13.233653965, -23.921361037), (-11.483653965, -20.890272124), (-8.452565052, -22.640272124), (-7.952565052, -21.77424672), (-10.983653965, -20.02424672), (-9.233653965, -16.993157806), (-10.099679369, -16.493157806), (-11.849679369, -19.52424672), (-14.880768282, -17.77424672), (-15.380768282, -18.640272124), (-12.349679369, -20.390272124), align=None)
        Polygon((-7.433012703, 11.874355655), (-5.683012702, 8.843266741), (-8.714101616, 7.093266741), (-8.214101616, 6.227241337), (-5.183012702, 7.977241336), (-3.433012703, 4.946152425), (-2.566987299, 5.446152425), (-4.316987299, 8.477241337), (-1.285898385, 10.227241337), (-1.785898385, 11.093266741), (-4.816987299, 9.343266741), (-6.566987299, 12.374355655), align=None)
        Polygon((-20.834234776, 12.184801987), (-19.940304487, 11.668776346), (-20.102964744, 11.386925384), (-20.996895032, 11.902951025), (-21.517828526, 11.000607275), (-21.800380609, 11.163968654), (-21.279447115, 12.066312404), (-22.173377404, 12.582338045), (-22.010717147, 12.864189006), (-21.116786859, 12.348163365), (-20.596554487, 13.24840375), (-20.314002404, 13.085042371), align=None)
    extrude(amount=-CUT_EXTRUDE2_DEPTH, mode=Mode.SUBTRACT)


solid = part.part
